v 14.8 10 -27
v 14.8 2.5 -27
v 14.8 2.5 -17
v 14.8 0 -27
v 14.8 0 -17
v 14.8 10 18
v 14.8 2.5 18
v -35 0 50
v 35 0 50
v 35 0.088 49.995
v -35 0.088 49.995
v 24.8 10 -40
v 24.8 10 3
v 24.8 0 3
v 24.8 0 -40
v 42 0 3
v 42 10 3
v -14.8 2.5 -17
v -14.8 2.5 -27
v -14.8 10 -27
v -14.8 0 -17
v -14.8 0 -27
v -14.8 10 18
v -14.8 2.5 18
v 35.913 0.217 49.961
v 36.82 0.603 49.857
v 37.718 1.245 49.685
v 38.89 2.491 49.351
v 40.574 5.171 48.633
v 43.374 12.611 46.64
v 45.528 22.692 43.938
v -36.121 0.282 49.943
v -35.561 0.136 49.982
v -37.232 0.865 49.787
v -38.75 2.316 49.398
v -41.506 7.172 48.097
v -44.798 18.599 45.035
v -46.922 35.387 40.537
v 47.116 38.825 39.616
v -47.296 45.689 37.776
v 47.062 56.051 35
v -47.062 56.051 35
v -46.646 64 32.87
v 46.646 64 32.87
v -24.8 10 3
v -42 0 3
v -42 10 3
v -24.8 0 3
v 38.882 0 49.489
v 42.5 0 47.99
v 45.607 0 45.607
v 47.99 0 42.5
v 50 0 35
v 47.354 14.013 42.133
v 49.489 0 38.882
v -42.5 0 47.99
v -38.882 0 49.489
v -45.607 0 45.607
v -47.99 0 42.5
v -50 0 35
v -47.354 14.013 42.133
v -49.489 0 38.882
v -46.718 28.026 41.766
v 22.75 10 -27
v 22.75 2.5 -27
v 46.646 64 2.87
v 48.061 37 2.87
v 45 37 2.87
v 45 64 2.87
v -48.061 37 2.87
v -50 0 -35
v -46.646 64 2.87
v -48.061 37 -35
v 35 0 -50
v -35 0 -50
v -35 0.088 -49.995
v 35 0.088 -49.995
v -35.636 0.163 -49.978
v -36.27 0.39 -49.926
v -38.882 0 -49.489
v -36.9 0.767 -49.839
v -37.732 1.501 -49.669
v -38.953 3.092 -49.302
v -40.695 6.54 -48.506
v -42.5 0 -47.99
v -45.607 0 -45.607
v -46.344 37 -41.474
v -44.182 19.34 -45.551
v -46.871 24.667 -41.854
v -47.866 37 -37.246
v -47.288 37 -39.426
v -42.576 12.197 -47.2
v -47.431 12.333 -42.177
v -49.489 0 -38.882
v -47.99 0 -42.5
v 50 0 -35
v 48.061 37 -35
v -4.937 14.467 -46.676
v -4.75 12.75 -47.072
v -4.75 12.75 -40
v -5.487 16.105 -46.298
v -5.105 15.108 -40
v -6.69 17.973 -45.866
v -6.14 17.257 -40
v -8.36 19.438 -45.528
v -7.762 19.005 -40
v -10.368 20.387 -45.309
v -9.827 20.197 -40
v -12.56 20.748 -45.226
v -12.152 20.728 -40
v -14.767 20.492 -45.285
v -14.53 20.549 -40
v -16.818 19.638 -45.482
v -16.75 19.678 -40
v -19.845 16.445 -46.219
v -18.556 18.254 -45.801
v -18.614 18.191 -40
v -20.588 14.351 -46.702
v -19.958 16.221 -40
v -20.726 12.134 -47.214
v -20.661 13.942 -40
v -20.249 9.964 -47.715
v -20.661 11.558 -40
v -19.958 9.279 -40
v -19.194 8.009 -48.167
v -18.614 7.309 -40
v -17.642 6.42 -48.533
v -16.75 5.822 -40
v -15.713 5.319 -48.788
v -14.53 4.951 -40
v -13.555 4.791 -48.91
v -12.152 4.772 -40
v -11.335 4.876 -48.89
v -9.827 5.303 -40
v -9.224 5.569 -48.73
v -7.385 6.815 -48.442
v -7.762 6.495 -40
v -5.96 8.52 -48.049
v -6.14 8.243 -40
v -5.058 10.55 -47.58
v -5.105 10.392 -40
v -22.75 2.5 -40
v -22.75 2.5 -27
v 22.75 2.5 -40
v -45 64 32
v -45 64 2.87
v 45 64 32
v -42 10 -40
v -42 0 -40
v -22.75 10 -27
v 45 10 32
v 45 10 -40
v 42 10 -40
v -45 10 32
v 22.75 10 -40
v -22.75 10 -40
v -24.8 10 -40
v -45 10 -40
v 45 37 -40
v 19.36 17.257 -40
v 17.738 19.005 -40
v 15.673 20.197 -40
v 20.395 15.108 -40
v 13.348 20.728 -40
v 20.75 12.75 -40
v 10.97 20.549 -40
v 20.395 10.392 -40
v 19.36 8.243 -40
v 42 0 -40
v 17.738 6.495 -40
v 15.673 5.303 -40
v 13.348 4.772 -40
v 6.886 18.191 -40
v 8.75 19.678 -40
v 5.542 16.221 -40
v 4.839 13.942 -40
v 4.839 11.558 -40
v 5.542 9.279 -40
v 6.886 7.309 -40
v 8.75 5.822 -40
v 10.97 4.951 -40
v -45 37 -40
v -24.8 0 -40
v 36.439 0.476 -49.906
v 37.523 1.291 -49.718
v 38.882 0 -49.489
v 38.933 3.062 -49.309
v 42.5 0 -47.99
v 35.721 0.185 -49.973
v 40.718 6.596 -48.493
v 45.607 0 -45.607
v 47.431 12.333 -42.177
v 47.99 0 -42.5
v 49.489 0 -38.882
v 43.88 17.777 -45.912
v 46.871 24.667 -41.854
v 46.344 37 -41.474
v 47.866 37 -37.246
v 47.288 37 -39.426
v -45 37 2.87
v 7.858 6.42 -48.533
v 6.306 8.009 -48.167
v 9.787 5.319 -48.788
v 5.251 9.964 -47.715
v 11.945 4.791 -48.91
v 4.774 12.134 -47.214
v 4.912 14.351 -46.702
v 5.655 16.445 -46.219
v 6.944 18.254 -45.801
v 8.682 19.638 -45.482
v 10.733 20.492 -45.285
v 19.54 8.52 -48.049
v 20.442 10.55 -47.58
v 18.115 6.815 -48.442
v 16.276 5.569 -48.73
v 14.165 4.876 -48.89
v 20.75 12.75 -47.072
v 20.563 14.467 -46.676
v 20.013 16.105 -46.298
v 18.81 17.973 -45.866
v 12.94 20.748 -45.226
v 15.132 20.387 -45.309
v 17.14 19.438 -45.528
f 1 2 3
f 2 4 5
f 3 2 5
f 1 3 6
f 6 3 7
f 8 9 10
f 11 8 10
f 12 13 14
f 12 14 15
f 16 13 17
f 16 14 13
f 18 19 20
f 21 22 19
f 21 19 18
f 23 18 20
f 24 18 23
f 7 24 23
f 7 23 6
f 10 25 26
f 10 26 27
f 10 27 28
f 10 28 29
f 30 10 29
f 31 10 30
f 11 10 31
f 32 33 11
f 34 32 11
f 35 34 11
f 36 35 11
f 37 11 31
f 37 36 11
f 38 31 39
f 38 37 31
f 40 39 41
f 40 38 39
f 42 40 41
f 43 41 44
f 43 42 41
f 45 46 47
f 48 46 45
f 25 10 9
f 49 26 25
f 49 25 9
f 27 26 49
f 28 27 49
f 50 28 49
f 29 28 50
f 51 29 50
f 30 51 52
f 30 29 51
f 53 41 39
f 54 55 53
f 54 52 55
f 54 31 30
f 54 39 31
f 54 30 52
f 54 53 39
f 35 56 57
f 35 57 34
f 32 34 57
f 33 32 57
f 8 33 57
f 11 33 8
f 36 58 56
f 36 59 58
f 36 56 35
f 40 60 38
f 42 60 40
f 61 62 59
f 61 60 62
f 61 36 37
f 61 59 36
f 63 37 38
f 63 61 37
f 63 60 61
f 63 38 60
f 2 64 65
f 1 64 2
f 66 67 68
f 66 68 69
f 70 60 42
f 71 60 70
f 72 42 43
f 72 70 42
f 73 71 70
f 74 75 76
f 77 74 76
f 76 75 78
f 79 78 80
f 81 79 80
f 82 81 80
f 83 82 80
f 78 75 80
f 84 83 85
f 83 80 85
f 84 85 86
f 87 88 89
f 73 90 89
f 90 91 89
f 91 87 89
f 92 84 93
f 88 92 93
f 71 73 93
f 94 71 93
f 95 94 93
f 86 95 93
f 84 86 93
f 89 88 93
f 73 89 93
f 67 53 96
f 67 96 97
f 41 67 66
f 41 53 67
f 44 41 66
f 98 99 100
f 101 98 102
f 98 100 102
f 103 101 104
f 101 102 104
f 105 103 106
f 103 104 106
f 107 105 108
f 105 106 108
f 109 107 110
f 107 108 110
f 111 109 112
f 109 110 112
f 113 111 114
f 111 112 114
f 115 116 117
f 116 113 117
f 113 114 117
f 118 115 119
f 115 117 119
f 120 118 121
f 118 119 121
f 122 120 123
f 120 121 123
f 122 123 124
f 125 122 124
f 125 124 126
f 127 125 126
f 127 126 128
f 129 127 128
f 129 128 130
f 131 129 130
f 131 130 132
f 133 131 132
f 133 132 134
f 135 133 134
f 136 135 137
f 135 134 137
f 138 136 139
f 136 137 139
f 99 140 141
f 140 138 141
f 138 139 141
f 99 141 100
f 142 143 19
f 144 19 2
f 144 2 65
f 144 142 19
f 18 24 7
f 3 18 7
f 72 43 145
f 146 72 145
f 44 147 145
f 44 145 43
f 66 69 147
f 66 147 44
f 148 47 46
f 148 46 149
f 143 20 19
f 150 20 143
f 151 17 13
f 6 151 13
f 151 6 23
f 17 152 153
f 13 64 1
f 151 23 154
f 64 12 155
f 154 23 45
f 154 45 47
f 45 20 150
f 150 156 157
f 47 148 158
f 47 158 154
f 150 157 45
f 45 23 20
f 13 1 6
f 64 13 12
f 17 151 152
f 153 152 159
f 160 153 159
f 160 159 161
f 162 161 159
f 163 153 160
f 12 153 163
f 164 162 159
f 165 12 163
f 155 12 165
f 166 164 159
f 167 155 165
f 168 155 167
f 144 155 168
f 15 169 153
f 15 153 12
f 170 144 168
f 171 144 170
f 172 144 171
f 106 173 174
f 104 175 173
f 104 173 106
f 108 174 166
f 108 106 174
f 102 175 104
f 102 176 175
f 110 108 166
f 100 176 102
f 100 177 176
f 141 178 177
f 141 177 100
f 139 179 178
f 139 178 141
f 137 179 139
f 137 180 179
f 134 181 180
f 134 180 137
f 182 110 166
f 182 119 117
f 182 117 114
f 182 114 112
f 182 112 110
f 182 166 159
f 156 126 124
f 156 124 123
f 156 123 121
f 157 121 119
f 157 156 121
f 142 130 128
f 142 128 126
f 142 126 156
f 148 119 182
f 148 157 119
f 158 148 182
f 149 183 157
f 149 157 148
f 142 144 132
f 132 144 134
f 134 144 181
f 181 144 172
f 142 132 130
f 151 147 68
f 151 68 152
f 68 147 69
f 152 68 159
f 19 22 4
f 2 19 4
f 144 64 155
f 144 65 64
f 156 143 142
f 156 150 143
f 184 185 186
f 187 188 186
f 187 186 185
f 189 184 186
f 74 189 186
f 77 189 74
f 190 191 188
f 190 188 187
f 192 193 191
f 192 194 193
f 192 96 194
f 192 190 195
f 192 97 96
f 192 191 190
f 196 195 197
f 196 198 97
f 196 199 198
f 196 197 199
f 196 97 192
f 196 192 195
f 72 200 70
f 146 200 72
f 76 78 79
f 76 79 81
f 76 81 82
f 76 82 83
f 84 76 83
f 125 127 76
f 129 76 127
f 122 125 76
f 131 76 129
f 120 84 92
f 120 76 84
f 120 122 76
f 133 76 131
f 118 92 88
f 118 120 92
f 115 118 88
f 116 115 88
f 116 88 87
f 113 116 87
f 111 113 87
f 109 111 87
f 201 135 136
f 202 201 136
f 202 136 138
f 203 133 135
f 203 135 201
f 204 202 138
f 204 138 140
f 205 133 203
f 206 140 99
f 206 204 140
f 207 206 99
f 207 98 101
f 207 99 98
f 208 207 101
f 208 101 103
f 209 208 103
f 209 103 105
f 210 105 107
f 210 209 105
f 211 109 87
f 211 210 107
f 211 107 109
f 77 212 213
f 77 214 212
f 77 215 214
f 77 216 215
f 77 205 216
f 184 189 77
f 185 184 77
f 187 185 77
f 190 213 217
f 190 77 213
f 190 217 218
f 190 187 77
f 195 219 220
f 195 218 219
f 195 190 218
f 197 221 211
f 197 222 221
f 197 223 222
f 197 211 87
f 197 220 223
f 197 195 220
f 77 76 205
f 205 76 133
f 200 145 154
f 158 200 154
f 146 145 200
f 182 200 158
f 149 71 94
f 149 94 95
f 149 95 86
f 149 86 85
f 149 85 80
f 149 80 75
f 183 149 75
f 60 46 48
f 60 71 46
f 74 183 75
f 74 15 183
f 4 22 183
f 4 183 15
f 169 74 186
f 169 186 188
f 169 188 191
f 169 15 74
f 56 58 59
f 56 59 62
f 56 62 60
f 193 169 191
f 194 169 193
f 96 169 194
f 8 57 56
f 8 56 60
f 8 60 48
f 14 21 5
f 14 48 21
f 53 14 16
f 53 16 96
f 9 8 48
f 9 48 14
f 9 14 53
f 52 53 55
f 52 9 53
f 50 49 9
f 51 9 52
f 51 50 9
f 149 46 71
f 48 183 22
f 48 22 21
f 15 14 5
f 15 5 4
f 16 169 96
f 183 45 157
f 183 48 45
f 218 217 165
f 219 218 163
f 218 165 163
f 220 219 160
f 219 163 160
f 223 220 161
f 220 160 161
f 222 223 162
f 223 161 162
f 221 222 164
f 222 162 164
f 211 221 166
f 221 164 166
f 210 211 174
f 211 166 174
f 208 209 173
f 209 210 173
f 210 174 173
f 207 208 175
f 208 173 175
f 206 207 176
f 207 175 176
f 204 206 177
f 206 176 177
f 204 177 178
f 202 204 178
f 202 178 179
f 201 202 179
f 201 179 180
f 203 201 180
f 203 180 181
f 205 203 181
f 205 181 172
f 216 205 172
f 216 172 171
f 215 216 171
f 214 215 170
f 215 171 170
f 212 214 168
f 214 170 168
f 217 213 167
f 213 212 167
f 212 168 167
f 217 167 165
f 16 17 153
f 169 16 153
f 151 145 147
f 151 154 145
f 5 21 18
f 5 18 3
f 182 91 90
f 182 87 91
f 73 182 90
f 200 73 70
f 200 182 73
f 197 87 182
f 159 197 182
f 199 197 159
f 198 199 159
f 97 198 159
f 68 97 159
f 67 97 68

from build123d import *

# Parameters (mm, degrees)
BOSS_EXTRUDE1_DEPTH     = 10
SKETCH2_W               = 17.2
SKETCH2_H               = 43
CUT_EXTRUDE1_DEPTH      = 72.414284285
SKETCH3_W               = 90
SKETCH3_H               = 34
SKETCH3_W_2             = 80
SKETCH3_H_2             = 24
BOSS_EXTRUDE3_DEPTH     = 15
SKETCH4_W               = 49.6
SKETCH4_H               = 5
BOSS_EXTRUDE4_DEPTH     = 10
SKETCH5_W               = 15
SKETCH5_H               = 22
BOSS_EXTRUDE5_DEPTH     = 5
SKETCH6_W               = 90
SKETCH6_H               = 77
BOSS_EXTRUDE6_DEPTH     = 15
BOSS_EXTRUDE8_DEPTH     = 39
CHAMFER1_SIZE           = 64
CHAMFER1_SIZE_2         = 3.354097874
CHAMFER2_SIZE           = 64
CHAMFER2_SIZE_2         = 11.405813635
CHAMFER3_SIZE           = 64
CHAMFER3_SIZE_2         = 13.775745352
CUT_EXTRUDE3_DEPTH      = 95.500525601
CUT_EXTRUDE3_DEPTH_BACK = 95.500525601
SKETCH10_W              = 50
SKETCH10_H              = 27
SKETCH11_W              = 45.5
SKETCH11_H              = 10.5
CUT_EXTRUDE4_DEPTH      = 7.5
SKETCH14_W              = 2.05
SKETCH14_H              = 10.5
BOSS_EXTRUDE9_DEPTH     = 15
SKETCH15_R              = 8
CUT_EXTRUDE5_DEPTH      = 122.227059686
CUT_EXTRUDE6_DEPTH      = 2.5
CUT_EXTRUDE7_REACH      = 97.373
SKETCH18_W              = 29.6
SKETCH18_H              = 45
CUT_EXTRUDE8_DEPTH      = 15
SKETCH21_W              = 29.6
SKETCH21_H              = 35
BOSS_EXTRUDE10_DEPTH    = 2.5
SKETCH22_W              = 90
SKETCH22_H              = 72
CUT_EXTRUDE9_DEPTH      = 54


with BuildPart() as part:
    # Sketch1 → Boss-Extrude1 (new body)
    with BuildSketch(Plane(origin=(0, 0, 0), x_dir=(1, 0, 0), z_dir=(0, 1, 0))):
        with BuildLine():
            Line((-35, 50), (35, 50))
            ThreePointArc((35, 50), (45.606601718, 45.606601718), (50, 35))
            Line((50, 35), (50, -35))
            ThreePointArc((50, -35), (45.606601718, -45.606601718), (35, -50))
            Line((35, -50), (-35, -50))
            ThreePointArc((-35, -50), (-45.606601718, -45.606601718), (-50, -35))
            Line((-50, -35), (-50, 35))
            ThreePointArc((-50, 35), (-45.606601718, 45.606601718), (-35, 50))
        make_face()
    extrude(amount=BOSS_EXTRUDE1_DEPTH)

    # Sketch2 → Cut-Extrude1 (cut, through all)
    with BuildSketch(Plane(origin=(0, 10, 0), x_dir=(1, 0, 0), z_dir=(0, 1, 0))):
        with Locations((-33.4, 18.5)):
            Rectangle(SKETCH2_W, SKETCH2_H)
        with Locations((33.4, 18.5)):
            Rectangle(SKETCH2_W, SKETCH2_H)
    extrude(amount=-CUT_EXTRUDE1_DEPTH, mode=Mode.SUBTRACT)

    # Sketch3 → Boss-Extrude3 (add)
    with BuildSketch(Plane(origin=(0, 10, 0), x_dir=(1, 0, 0), z_dir=(0, 1, 0))):
        with Locations((0, -20)):
            Rectangle(SKETCH3_W, SKETCH3_H)
        with Locations((0, -20)):
            Rectangle(SKETCH3_W_2, SKETCH3_H_2, mode=Mode.SUBTRACT)
    extrude(amount=BOSS_EXTRUDE3_DEPTH)

    # Sketch4 → Boss-Extrude4 (add)
    with BuildSketch(Plane(origin=(0, 10, 0), x_dir=(1, 0, 0), z_dir=(0, 1, 0))):
        with Locations((0, 10)):
            Rectangle(SKETCH4_W, SKETCH4_H)
        with Locations((0, 27)):
            Rectangle(SKETCH4_W, SKETCH4_H)
    extrude(amount=BOSS_EXTRUDE4_DEPTH)

    # Sketch5 → Boss-Extrude5 (add)
    with BuildSketch(Plane(origin=(0, 20, 0), x_dir=(1, 0, 0), z_dir=(0, 1, 0))):
        with Locations((-17.3, 18.5)):
            Rectangle(SKETCH5_W, SKETCH5_H)
        with Locations((17.3, 18.5)):
            Rectangle(SKETCH5_W, SKETCH5_H)
    extrude(amount=BOSS_EXTRUDE5_DEPTH)

    # Sketch6 → Boss-Extrude6 (add)
    with BuildSketch(Plane(origin=(0, 10, 0), x_dir=(1, 0, 0), z_dir=(0, 1, 0))):
        with BuildLine():
            Line((-50, 35), (-50, -35))
            ThreePointArc((-50, -35), (-45.606601718, -45.606601718), (-35, -50))
            Line((-35, -50), (35, -50))
            ThreePointArc((35, -50), (45.606601718, -45.606601718), (50, -35))
            Line((50, -35), (50, 35))
            ThreePointArc((50, 35), (45.606601718, 45.606601718), (35, 50))
            Line((35, 50), (-35, 50))
            ThreePointArc((-35, 50), (-45.606601718, 45.606601718), (-50, 35))
        make_face()
        with Locations((0, 1.5)):
            Rectangle(SKETCH6_W, SKETCH6_H, mode=Mode.SUBTRACT)
    extrude(amount=BOSS_EXTRUDE6_DEPTH)

    # Sketch9 → Boss-Extrude8 (add)
    with BuildSketch(Plane(origin=(0, 25, 0), x_dir=(1, 0, 0), z_dir=(0, 1, 0))):
        with BuildLine():
            Line((-50, 35), (-50, -35))
            ThreePointArc((-50, -35), (-45.606601718, -45.606601718), (-35, -50))
            Line((-35, -50), (35, -50))
            ThreePointArc((35, -50), (45.606601718, -45.606601718), (50, -35))
            Line((50, -35), (50, 35))
            ThreePointArc((50, 35), (45.606601718, 45.606601718), (35, 50))
            Line((35, 50), (-35, 50))
            ThreePointArc((-35, 50), (-45.606601718, 45.606601718), (-50, 35))
        make_face()
        with BuildLine():
            Line((-45, 35), (-45, -32))
            Line((-45, -32), (45, -32))
            Line((45, -32), (45, 35))
            ThreePointArc((45, 35), (44.659258263, 37.588190451), (43.660254038, 40))
            Line((43.660254038, 40), (-43.660254038, 40))
            ThreePointArc((-43.660254038, 40), (-44.659258263, 37.588190451), (-45, 35))
        make_face(mode=Mode.SUBTRACT)
    extrude(amount=BOSS_EXTRUDE8_DEPTH)

    # Chamfer1
    # the kernel refuses this chamfer: 64, 3.354097874 mm, written as the material it takes off along each edge
    with BuildSketch(Plane(origin=(-35, 64, 50), x_dir=(0, -0.9999979738662979, 0.002013023422382214), z_dir=(1, 0, 0)), Plane(origin=(50, 64, 35), x_dir=(0.002013023422382214, -0.9999979738662979, 0), z_dir=(0, 0, -1)), Plane(origin=(-50, 64, -35), x_dir=(-0.002013023422382214, -0.9999979738662979, 0), z_dir=(0, 0, 1)), Plane(origin=(35, 64, -50), x_dir=(0, -0.9999979738662979, -0.002013023422382214), z_dir=(-1, 0, 0))) as chamfer1_piece_1:
        Polygon((CHAMFER1_SIZE * 0.999997973866, CHAMFER1_SIZE * 0.00201302342238), (-CHAMFER1_SIZE_2 * 0.00201302342245, CHAMFER1_SIZE_2 * 0.9999979739), (0, 0), align=None)
    extrude(amount=70, mode=Mode.SUBTRACT)
    with BuildSketch(Plane(origin=(35, 64, 35), x_dir=(0, 0, 1), z_dir=(-1, 0, 0))) as chamfer1_piece_2:
        Polygon((15, -CHAMFER1_SIZE), (15 - CHAMFER1_SIZE_2, 0), (15, 0), align=None)
    revolve(axis=Axis((35, 64, 35), (0, 1, 0)), revolution_arc=90, mode=Mode.SUBTRACT)
    with BuildSketch(Plane(origin=(-35, 64, 35), x_dir=(-1, 0, 0), z_dir=(0, 0, -1))) as chamfer1_piece_3:
        Polygon((15, -CHAMFER1_SIZE), (15 - CHAMFER1_SIZE_2, 0), (15, 0), align=None)
    revolve(axis=Axis((-35, 64, 35), (0, 1, 0)), revolution_arc=90, mode=Mode.SUBTRACT)
    with BuildSketch(Plane(origin=(35, 64, -35), x_dir=(1, 0, 0), z_dir=(0, 0, 1))) as chamfer1_piece_4:
        Polygon((15, -CHAMFER1_SIZE), (15 - CHAMFER1_SIZE_2, 0), (15, 0), align=None)
    revolve(axis=Axis((35, 64, -35), (0, 1, 0)), revolution_arc=90, mode=Mode.SUBTRACT)
    with BuildSketch(Plane(origin=(-35, 64, -35), x_dir=(0, 0, -1), z_dir=(1, 0, 0))) as chamfer1_piece_5:
        Polygon((15 - CHAMFER1_SIZE_2, 0), (15, -CHAMFER1_SIZE), (15, 0), align=None)
    revolve(axis=Axis((-35, 64, -35), (0, 1, 0)), revolution_arc=90, mode=Mode.SUBTRACT)

    # Chamfer2
    # the kernel refuses this chamfer: 64, 11.405813635 mm, written as the material it takes off along each edge
    with BuildSketch(Plane(origin=(201.306482971, 64, -46.645902126), x_dir=(0, -0.9982575003065525, -0.05900816114499234), z_dir=(-1, 0, 0))) as chamfer2_piece_1:
        Polygon((CHAMFER2_SIZE * 0.999977671636, CHAMFER2_SIZE * 0.0066825316561), (-CHAMFER2_SIZE_2 * 0.0590081611462, CHAMFER2_SIZE_2 * 0.998257500326), (0, 0), align=None)
    extrude(amount=402.612965942, mode=Mode.SUBTRACT)

    # Chamfer3
    # the kernel refuses this chamfer: 64, 13.775745352 mm, written as the material it takes off along each edge
    with BuildSketch(Plane(origin=(-201.265469314, 64, 46.645902126), x_dir=(0, -0.9981787050157903, 0.06032638604292662), z_dir=(1, 0, 0))) as chamfer3_piece_1:
        Polygon((CHAMFER3_SIZE * 0.999967974892, CHAMFER3_SIZE * 0.00800307379952), (-CHAMFER3_SIZE_2 * 0.060326386045, CHAMFER3_SIZE_2 * 0.99817870505), (0, 0), align=None)
    extrude(amount=402.530938629, mode=Mode.SUBTRACT)

    # Sketch10 → Cut-Extrude3 (cut, two sides: drawn at the far end of the back side and taken through both)
    with BuildSketch(Plane(origin=(0, 1.307501734, 0), x_dir=(0, 0, 1), z_dir=(-1, 0, 0)).offset(-CUT_EXTRUDE3_DEPTH_BACK)):
        with Locations((-22.129843227, 49.192498266)):
            Rectangle(SKETCH10_W, SKETCH10_H)
    extrude(amount=CUT_EXTRUDE3_DEPTH + CUT_EXTRUDE3_DEPTH_BACK, mode=Mode.SUBTRACT)

    # Sketch11 → Cut-Extrude4 (cut)
    with BuildSketch(Plane(origin=(0, 10, 0), x_dir=(1, 0, 0), z_dir=(0, 1, 0))):
        with Locations((0, 34.75)):
            Rectangle(SKETCH11_W, SKETCH11_H)
    extrude(amount=-CUT_EXTRUDE4_DEPTH, mode=Mode.SUBTRACT)

    # Sketch14 → Boss-Extrude9 (add)
    with BuildSketch(Plane(origin=(0, 10, 0), x_dir=(1, 0, 0), z_dir=(0, 1, 0))):
        with Locations((-23.775, 34.75)):
            Rectangle(SKETCH14_W, SKETCH14_H)
        with Locations((23.775, 34.75)):
            Rectangle(SKETCH14_W, SKETCH14_H)
    extrude(amount=BOSS_EXTRUDE9_DEPTH)

    # Sketch15 → Cut-Extrude5 (cut, through all)
    with BuildSketch(Plane.XY.offset(-40)):
        with Locations((-12.75, 12.75)):
            Circle(SKETCH15_R)
        with Locations((12.75, 12.75)):
            Circle(SKETCH15_R)
    extrude(amount=-CUT_EXTRUDE5_DEPTH, mode=Mode.SUBTRACT)

    # Sketch17 → Cut-Extrude6 (cut)
    with BuildSketch(Plane(origin=(0, 0, -29.5), x_dir=(-1, 0, 0), z_dir=(0, 0, -1))):
        Polygon((-9.8, 25), (-22.75, 25), (-22.75, 2.5), (22.75, 2.5), (22.75, 25), (9.8, 25), (9.8, 20), (-9.8, 20), align=None)
    extrude(amount=-CUT_EXTRUDE6_DEPTH, mode=Mode.SUBTRACT)

    # Cut-Extrude7: up to this face of the body (flat: up to its plane)
    cut_extrude7_end = Plane(part.part.faces().sort_by_distance((0, 10, -18.5))[0])
    # Sketch18 → Cut-Extrude7 (cut, up to the picked face)
    with BuildSketch(Plane.XZ, mode=Mode.PRIVATE) as cut_extrude7_sk1:
        with Locations((0, -4.5)):
            Rectangle(SKETCH18_W, SKETCH18_H)
    cut_extrude7_tool1 = split(extrude(cut_extrude7_sk1.sketch, amount=-CUT_EXTRUDE7_REACH, mode=Mode.PRIVATE), bisect_by=cut_extrude7_end, keep=Keep.BOTH, mode=Mode.PRIVATE)
    add(cut_extrude7_tool1.solids().sort_by(Axis((0, 0, -4.5), (0, 1, 0)))[0], mode=Mode.SUBTRACT)

    # Sketch20 → Cut-Extrude8 (cut)
    with BuildSketch(Plane.XZ.offset(-25)):
        with BuildLine():
            Line((-45, -35), (-45, -40))
            Line((-45, -40), (-43.660254038, -40))
            ThreePointArc((-43.660254038, -40), (-44.659258263, -37.588190451), (-45, -35))
        make_face()
        with BuildLine():
            Line((45, -40), (45, -35))
            ThreePointArc((45, -35), (44.659258263, -37.588190451), (43.660254038, -40))
            Line((43.660254038, -40), (45, -40))
        make_face()
    extrude(amount=-CUT_EXTRUDE8_DEPTH, mode=Mode.SUBTRACT)

    # Sketch21 → Boss-Extrude10 (add)
    with BuildSketch(Plane.XZ):
        with Locations((0, 0.5)):
            Rectangle(SKETCH21_W, SKETCH21_H)
    extrude(amount=-BOSS_EXTRUDE10_DEPTH)

    # Sketch22 → Cut-Extrude9 (cut)
    with BuildSketch(Plane(origin=(0, 64, 0), x_dir=(1, 0, 0), z_dir=(0, 1, 0))):
        with Locations((0, 4)):
            Rectangle(SKETCH22_W, SKETCH22_H)
    extrude(amount=-CUT_EXTRUDE9_DEPTH, mode=Mode.SUBTRACT)


solid = part.part
